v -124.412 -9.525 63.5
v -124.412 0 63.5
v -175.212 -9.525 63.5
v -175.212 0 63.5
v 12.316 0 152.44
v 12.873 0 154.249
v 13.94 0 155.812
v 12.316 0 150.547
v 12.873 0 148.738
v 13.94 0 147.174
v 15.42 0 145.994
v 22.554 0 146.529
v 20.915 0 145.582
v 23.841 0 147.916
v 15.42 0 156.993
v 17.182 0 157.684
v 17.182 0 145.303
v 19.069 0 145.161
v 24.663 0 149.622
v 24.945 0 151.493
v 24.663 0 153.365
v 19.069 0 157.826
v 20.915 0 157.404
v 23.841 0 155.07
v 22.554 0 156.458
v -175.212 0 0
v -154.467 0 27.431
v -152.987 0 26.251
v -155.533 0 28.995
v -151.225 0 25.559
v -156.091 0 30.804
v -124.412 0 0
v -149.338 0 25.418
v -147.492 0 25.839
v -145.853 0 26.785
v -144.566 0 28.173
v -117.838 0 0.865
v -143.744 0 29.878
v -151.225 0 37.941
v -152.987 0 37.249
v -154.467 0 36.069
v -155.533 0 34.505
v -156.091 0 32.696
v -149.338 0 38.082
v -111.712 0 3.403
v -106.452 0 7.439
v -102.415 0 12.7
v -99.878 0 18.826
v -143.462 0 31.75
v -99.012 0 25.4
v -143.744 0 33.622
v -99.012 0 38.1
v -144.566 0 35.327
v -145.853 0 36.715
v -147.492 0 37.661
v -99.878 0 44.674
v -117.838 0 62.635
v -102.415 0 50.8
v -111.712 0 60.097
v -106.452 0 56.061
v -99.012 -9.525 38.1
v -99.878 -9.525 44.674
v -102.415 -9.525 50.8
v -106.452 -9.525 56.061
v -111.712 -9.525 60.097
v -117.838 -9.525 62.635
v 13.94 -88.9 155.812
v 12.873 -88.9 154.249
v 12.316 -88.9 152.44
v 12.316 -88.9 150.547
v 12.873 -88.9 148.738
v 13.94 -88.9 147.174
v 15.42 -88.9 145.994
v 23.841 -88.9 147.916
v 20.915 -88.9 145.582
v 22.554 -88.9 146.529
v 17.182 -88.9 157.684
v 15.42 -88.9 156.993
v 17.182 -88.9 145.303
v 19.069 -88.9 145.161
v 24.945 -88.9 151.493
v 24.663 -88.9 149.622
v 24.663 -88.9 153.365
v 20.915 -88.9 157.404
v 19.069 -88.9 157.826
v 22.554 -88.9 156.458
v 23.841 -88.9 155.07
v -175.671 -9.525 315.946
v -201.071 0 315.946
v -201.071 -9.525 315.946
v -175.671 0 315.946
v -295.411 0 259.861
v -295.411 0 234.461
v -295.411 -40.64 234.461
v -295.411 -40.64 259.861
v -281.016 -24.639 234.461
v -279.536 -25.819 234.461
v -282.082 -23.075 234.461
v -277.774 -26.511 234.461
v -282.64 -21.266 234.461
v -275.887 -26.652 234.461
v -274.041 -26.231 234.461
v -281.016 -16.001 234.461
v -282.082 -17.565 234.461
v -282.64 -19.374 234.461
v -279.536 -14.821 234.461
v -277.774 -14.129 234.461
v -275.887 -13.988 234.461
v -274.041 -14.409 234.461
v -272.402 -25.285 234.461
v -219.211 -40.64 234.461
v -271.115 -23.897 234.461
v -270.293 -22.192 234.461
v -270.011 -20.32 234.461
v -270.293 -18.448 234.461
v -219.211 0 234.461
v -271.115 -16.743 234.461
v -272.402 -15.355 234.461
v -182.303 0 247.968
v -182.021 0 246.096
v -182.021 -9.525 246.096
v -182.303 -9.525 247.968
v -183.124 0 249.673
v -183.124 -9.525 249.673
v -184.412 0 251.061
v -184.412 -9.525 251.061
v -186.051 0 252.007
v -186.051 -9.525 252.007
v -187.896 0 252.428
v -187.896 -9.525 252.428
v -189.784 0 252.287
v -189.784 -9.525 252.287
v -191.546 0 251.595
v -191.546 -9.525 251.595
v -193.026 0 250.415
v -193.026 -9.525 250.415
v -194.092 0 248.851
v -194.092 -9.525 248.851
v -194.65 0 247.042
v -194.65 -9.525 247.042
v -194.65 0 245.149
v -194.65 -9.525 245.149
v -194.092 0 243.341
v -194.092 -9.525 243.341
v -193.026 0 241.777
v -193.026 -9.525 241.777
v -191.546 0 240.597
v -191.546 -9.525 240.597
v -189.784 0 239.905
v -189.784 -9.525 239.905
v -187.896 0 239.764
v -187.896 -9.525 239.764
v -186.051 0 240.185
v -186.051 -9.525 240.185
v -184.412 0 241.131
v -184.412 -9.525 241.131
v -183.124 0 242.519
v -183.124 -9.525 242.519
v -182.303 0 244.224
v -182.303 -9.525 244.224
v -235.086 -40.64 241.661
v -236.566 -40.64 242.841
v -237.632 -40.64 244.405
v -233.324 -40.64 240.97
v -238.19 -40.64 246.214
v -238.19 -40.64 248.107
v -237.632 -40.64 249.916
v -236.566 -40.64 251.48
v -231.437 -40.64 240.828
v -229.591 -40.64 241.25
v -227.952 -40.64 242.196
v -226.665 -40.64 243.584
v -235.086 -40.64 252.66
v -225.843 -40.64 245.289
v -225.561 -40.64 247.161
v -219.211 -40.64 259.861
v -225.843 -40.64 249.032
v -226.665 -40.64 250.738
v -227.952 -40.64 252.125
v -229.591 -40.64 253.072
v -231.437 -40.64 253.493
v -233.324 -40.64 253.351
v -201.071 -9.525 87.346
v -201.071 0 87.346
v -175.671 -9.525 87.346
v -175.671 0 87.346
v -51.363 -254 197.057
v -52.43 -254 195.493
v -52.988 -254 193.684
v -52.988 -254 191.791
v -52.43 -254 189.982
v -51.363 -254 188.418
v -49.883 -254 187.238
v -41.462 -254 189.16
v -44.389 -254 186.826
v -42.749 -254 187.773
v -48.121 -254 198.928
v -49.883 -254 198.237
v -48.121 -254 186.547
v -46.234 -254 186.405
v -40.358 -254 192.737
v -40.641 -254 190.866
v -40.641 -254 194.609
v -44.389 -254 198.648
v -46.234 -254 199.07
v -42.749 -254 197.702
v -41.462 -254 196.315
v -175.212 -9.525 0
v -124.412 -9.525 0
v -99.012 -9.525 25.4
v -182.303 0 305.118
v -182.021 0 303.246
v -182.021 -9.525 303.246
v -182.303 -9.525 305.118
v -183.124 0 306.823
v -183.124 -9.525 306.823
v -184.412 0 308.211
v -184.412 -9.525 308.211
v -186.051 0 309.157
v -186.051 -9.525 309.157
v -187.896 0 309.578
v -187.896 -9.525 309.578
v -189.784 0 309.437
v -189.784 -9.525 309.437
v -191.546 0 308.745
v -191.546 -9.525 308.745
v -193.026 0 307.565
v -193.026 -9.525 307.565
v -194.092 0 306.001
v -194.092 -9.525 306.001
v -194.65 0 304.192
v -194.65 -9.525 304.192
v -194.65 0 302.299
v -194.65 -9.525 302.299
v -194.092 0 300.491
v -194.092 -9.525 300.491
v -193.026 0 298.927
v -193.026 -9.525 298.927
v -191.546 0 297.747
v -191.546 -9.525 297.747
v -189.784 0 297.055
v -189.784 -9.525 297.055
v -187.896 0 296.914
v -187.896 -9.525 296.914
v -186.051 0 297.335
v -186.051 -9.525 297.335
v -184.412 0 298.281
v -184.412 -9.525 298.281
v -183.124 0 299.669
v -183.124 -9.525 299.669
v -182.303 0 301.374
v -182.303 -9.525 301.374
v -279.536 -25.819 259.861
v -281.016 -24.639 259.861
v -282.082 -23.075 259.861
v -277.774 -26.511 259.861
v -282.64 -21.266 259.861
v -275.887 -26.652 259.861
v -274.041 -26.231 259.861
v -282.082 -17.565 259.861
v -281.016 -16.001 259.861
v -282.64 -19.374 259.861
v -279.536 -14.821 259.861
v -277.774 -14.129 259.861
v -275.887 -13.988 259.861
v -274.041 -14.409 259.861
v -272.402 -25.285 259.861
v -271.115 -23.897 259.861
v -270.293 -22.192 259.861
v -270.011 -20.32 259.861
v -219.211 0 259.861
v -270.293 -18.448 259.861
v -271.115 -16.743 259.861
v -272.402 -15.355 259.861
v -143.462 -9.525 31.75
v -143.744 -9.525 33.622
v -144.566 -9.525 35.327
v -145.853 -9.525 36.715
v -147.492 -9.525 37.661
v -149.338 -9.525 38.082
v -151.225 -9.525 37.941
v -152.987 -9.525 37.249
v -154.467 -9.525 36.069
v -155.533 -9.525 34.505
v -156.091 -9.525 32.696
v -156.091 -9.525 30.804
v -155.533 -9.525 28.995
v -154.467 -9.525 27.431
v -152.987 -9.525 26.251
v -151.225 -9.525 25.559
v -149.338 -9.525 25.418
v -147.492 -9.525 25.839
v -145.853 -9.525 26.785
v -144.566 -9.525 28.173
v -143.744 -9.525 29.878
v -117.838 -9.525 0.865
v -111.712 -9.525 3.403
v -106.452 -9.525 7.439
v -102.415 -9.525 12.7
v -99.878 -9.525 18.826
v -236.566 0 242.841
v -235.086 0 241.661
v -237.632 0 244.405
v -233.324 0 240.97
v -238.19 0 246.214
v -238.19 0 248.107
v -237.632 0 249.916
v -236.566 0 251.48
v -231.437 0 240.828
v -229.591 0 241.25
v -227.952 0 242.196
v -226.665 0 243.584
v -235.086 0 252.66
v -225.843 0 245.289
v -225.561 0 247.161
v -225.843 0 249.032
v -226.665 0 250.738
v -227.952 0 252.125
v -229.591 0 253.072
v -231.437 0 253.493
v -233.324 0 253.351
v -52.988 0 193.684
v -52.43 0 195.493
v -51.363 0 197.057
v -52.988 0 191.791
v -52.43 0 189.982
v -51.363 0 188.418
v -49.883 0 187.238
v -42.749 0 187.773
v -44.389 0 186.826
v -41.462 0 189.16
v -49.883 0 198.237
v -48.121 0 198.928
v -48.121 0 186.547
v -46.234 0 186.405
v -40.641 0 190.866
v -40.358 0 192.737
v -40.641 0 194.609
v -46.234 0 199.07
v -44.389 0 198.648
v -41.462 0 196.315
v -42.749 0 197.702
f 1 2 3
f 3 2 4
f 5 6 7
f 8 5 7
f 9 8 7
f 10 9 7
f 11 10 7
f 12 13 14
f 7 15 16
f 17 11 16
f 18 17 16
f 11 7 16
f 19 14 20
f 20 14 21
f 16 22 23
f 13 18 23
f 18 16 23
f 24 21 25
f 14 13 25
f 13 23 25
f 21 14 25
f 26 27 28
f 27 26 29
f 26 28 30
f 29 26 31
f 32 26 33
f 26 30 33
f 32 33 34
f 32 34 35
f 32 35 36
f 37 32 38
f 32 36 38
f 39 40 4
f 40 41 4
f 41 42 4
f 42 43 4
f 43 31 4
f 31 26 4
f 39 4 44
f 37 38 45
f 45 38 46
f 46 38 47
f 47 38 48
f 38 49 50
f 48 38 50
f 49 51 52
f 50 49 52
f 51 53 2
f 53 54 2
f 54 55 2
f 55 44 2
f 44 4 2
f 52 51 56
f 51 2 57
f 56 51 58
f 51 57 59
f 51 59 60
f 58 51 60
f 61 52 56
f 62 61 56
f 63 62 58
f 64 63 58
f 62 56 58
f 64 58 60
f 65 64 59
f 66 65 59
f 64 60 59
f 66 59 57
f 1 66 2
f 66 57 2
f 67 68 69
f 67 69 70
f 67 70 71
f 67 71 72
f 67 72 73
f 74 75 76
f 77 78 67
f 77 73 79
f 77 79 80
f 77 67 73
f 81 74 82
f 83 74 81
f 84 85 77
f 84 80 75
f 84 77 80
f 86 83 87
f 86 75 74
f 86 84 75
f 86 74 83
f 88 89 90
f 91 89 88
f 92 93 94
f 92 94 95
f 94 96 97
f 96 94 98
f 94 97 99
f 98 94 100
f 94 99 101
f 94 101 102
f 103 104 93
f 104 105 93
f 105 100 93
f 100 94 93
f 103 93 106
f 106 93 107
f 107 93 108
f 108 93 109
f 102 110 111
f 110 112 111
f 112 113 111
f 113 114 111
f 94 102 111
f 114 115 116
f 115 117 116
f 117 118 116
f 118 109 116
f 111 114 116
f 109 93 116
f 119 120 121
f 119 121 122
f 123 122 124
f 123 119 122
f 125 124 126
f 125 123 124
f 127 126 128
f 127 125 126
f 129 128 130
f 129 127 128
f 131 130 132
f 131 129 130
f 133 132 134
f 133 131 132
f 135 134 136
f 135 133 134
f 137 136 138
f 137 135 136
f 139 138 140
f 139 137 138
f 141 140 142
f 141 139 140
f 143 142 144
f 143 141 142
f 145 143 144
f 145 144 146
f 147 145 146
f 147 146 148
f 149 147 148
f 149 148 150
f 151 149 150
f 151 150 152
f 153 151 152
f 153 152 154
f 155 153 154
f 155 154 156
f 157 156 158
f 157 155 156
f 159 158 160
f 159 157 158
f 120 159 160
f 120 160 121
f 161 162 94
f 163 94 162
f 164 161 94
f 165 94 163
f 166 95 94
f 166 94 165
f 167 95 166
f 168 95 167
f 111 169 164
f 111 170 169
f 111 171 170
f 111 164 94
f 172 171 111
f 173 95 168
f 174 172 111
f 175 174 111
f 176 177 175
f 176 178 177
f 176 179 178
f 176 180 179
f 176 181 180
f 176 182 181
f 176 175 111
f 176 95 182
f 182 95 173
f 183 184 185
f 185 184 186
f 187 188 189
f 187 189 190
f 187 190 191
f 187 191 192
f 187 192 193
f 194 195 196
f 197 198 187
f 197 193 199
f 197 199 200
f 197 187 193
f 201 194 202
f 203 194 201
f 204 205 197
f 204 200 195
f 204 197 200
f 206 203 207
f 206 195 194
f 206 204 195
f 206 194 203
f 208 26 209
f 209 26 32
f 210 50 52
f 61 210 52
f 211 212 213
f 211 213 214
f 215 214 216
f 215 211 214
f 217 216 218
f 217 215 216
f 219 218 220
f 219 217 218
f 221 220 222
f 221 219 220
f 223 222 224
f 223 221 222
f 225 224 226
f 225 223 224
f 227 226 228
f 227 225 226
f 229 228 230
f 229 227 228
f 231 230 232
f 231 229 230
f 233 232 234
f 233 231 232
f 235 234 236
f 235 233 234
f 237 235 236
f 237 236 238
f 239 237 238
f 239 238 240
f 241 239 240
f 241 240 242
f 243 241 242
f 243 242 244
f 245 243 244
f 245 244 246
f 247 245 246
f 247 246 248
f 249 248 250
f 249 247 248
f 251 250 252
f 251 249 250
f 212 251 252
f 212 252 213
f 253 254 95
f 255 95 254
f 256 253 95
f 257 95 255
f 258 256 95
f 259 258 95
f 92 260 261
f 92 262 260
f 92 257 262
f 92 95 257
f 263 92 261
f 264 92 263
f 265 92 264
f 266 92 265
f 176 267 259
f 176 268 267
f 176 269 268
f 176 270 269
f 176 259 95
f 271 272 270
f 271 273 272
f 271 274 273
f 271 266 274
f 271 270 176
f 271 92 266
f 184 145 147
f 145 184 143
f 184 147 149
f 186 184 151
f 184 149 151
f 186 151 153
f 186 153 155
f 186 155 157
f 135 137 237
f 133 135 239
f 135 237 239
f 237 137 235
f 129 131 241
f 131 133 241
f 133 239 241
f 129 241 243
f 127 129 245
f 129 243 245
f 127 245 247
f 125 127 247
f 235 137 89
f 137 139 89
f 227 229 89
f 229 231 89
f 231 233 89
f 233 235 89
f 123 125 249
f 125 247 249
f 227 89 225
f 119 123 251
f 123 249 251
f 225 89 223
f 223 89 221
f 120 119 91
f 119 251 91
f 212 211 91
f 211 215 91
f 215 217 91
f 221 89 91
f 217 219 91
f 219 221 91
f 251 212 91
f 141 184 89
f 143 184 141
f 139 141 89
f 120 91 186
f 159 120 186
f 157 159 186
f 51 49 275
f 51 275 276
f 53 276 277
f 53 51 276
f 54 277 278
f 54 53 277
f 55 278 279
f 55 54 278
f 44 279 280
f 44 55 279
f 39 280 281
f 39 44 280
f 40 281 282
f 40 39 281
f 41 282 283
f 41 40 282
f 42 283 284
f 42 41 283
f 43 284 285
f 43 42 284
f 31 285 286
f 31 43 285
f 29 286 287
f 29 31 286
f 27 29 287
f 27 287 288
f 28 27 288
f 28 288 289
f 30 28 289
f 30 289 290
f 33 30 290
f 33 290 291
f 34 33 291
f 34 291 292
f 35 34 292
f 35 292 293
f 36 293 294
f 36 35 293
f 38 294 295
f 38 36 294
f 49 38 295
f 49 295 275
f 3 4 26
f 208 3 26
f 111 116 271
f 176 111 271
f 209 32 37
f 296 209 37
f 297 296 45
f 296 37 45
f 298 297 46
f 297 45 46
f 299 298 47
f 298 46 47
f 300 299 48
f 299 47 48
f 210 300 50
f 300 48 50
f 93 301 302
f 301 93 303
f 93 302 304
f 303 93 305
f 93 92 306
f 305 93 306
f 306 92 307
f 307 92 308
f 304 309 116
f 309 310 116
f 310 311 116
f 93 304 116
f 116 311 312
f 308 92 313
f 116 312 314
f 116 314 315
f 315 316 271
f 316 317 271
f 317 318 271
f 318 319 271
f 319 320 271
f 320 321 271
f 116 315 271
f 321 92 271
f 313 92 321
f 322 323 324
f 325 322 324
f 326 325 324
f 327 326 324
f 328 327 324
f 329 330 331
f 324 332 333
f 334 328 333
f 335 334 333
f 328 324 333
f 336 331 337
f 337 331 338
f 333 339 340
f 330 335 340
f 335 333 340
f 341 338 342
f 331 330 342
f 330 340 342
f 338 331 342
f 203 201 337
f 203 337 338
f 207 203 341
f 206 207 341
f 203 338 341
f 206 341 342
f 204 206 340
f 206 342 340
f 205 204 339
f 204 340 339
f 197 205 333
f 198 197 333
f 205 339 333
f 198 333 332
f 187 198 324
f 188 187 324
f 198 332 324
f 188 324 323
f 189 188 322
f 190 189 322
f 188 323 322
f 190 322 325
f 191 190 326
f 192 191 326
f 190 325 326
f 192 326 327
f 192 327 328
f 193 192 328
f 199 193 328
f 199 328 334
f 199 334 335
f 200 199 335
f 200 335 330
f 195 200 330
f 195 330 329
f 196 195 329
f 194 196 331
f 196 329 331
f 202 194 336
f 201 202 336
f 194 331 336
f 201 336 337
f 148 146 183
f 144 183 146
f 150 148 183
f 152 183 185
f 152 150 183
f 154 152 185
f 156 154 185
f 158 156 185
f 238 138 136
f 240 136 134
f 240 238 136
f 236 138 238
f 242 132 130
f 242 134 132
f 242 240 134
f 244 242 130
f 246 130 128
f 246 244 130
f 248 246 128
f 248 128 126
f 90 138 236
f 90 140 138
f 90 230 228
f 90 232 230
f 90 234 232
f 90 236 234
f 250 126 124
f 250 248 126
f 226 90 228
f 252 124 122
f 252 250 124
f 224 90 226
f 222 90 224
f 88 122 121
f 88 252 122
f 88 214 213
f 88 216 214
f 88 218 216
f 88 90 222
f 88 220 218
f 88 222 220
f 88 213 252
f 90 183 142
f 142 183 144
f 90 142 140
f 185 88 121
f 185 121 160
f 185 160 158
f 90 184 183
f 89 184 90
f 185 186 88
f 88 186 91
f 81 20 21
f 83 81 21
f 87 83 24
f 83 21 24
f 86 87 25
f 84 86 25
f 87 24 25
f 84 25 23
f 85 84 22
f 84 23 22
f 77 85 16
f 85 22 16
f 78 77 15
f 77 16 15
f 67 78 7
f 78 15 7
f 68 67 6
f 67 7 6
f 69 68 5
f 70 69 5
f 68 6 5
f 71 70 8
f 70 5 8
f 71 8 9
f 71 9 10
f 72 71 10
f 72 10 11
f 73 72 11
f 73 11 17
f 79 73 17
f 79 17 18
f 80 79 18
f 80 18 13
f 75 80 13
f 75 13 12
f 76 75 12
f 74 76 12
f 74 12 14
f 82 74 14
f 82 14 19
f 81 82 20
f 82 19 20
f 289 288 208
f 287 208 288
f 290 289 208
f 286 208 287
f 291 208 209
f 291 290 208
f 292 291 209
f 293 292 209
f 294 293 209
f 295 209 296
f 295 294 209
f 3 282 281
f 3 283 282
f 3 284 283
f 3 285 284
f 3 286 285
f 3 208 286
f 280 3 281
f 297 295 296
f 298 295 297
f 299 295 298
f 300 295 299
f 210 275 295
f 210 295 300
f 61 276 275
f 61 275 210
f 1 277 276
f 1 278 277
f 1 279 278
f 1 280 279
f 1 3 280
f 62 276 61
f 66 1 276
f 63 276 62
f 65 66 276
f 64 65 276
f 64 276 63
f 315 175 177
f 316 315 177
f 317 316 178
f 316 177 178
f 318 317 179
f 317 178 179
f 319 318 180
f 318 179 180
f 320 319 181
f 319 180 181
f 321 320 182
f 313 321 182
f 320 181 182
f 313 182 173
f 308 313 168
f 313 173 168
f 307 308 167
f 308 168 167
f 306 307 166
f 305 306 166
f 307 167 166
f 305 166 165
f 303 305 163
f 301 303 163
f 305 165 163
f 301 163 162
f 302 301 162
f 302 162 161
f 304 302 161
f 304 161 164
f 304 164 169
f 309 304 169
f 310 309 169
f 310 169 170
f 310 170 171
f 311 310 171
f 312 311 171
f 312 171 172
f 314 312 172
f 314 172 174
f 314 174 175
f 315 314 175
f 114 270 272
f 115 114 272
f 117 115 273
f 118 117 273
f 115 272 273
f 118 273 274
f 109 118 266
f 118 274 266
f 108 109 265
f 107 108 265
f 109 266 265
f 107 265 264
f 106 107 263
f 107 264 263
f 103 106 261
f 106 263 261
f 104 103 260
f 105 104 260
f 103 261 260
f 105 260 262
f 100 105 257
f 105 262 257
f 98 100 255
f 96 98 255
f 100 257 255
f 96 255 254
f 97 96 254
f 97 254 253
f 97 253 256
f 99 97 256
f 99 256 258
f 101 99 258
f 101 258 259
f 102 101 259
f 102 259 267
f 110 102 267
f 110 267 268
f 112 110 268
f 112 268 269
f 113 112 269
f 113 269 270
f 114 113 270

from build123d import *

# Parameters (mm, degrees)
F0_W      = 25.4
F0_H      = 228.6
F0_R      = 6.35
F1_DEPTH  = 9.525
F2_W      = 76.2
F2_H      = 25.4
F3_DEPTH  = 40.64
F4_R      = 6.35
F5_DEPTH  = 57.7088
F6_DEPTH  = 57.7088
F7_R      = 6.35
F8_DEPTH  = 50.8
F9_R      = 6.35
F10_DEPTH = 254
F11_R     = 6.35
F12_DEPTH = 88.9
F13_R     = 6.35
F14_DEPTH = 9.525


with BuildPart() as f1:
    # F0 (on Front) → F1 (new body)
    with BuildSketch(Plane.XZ):
        with Locations((-188.370965, 201.645905)):
            Rectangle(F0_W, F0_H)
        with Locations((-188.370965, 246.095905)):
            Circle(F0_R, mode=Mode.SUBTRACT)
        with Locations((-188.370965, 303.245905)):
            Circle(F0_R, mode=Mode.SUBTRACT)
    extrude(amount=F1_DEPTH)


with BuildPart() as f3:
    # F2 (on Front) → F3 (new body)
    with BuildSketch(Plane.XZ):
        with Locations((-257.311338, 247.160584)):
            Rectangle(F2_W, F2_H)
    extrude(amount=F3_DEPTH)

    # F4 (on face) → F5 (join)
    with BuildSketch(Plane.XZ.offset(40.64)):
        with Locations((-231.911338, 247.160584)):
            Circle(F4_R)
    extrude(amount=-F5_DEPTH)

    # F4 (on face) → F6 (cut)
    with BuildSketch(Plane.XZ.offset(40.64)):
        with Locations((-231.911338, 247.160584)):
            Circle(F4_R)
    extrude(amount=-F6_DEPTH, mode=Mode.SUBTRACT)

    # F7 (on face) → F8 (cut)
    with BuildSketch(Plane.XY.offset(259.860584)):
        with Locations((-276.361338, -20.32)):
            Circle(F7_R)
    extrude(amount=-F8_DEPTH, mode=Mode.SUBTRACT)


with BuildPart() as f10:
    # F9 (on Front) → F10 (new body)
    with BuildSketch(Plane.XZ):
        with Locations((-46.708483, 192.737445)):
            Circle(F9_R)
    extrude(amount=F10_DEPTH)


with BuildPart() as f12:
    # F11 (on Front) → F12 (new body)
    with BuildSketch(Plane.XZ):
        with Locations((18.594613, 151.493385)):
            Circle(F11_R)
    extrude(amount=F12_DEPTH)


with BuildPart() as f14:
    # F13 (on Front) → F14 (new body)
    with BuildSketch(Plane.XZ):
        with BuildLine():
            Line((-124.412132, 63.5), (-175.212132, 63.5))
            Line((-175.212132, 63.5), (-175.212132, 0))
            Line((-175.212132, 0), (-124.412132, 0))
            ThreePointArc((-124.412132, 0), (-106.45162, 7.439488), (-99.012132, 25.4))
            Line((-99.012132, 25.4), (-99.012132, 38.1))
            ThreePointArc((-99.012132, 38.1), (-106.45162, 56.060512), (-124.412132, 63.5))
        make_face()
        with Locations((-149.812132, 31.75)):
            Circle(F13_R, mode=Mode.SUBTRACT)
    extrude(amount=F14_DEPTH)


solid = Compound([f1.part, f3.part, f10.part, f12.part, f14.part])
